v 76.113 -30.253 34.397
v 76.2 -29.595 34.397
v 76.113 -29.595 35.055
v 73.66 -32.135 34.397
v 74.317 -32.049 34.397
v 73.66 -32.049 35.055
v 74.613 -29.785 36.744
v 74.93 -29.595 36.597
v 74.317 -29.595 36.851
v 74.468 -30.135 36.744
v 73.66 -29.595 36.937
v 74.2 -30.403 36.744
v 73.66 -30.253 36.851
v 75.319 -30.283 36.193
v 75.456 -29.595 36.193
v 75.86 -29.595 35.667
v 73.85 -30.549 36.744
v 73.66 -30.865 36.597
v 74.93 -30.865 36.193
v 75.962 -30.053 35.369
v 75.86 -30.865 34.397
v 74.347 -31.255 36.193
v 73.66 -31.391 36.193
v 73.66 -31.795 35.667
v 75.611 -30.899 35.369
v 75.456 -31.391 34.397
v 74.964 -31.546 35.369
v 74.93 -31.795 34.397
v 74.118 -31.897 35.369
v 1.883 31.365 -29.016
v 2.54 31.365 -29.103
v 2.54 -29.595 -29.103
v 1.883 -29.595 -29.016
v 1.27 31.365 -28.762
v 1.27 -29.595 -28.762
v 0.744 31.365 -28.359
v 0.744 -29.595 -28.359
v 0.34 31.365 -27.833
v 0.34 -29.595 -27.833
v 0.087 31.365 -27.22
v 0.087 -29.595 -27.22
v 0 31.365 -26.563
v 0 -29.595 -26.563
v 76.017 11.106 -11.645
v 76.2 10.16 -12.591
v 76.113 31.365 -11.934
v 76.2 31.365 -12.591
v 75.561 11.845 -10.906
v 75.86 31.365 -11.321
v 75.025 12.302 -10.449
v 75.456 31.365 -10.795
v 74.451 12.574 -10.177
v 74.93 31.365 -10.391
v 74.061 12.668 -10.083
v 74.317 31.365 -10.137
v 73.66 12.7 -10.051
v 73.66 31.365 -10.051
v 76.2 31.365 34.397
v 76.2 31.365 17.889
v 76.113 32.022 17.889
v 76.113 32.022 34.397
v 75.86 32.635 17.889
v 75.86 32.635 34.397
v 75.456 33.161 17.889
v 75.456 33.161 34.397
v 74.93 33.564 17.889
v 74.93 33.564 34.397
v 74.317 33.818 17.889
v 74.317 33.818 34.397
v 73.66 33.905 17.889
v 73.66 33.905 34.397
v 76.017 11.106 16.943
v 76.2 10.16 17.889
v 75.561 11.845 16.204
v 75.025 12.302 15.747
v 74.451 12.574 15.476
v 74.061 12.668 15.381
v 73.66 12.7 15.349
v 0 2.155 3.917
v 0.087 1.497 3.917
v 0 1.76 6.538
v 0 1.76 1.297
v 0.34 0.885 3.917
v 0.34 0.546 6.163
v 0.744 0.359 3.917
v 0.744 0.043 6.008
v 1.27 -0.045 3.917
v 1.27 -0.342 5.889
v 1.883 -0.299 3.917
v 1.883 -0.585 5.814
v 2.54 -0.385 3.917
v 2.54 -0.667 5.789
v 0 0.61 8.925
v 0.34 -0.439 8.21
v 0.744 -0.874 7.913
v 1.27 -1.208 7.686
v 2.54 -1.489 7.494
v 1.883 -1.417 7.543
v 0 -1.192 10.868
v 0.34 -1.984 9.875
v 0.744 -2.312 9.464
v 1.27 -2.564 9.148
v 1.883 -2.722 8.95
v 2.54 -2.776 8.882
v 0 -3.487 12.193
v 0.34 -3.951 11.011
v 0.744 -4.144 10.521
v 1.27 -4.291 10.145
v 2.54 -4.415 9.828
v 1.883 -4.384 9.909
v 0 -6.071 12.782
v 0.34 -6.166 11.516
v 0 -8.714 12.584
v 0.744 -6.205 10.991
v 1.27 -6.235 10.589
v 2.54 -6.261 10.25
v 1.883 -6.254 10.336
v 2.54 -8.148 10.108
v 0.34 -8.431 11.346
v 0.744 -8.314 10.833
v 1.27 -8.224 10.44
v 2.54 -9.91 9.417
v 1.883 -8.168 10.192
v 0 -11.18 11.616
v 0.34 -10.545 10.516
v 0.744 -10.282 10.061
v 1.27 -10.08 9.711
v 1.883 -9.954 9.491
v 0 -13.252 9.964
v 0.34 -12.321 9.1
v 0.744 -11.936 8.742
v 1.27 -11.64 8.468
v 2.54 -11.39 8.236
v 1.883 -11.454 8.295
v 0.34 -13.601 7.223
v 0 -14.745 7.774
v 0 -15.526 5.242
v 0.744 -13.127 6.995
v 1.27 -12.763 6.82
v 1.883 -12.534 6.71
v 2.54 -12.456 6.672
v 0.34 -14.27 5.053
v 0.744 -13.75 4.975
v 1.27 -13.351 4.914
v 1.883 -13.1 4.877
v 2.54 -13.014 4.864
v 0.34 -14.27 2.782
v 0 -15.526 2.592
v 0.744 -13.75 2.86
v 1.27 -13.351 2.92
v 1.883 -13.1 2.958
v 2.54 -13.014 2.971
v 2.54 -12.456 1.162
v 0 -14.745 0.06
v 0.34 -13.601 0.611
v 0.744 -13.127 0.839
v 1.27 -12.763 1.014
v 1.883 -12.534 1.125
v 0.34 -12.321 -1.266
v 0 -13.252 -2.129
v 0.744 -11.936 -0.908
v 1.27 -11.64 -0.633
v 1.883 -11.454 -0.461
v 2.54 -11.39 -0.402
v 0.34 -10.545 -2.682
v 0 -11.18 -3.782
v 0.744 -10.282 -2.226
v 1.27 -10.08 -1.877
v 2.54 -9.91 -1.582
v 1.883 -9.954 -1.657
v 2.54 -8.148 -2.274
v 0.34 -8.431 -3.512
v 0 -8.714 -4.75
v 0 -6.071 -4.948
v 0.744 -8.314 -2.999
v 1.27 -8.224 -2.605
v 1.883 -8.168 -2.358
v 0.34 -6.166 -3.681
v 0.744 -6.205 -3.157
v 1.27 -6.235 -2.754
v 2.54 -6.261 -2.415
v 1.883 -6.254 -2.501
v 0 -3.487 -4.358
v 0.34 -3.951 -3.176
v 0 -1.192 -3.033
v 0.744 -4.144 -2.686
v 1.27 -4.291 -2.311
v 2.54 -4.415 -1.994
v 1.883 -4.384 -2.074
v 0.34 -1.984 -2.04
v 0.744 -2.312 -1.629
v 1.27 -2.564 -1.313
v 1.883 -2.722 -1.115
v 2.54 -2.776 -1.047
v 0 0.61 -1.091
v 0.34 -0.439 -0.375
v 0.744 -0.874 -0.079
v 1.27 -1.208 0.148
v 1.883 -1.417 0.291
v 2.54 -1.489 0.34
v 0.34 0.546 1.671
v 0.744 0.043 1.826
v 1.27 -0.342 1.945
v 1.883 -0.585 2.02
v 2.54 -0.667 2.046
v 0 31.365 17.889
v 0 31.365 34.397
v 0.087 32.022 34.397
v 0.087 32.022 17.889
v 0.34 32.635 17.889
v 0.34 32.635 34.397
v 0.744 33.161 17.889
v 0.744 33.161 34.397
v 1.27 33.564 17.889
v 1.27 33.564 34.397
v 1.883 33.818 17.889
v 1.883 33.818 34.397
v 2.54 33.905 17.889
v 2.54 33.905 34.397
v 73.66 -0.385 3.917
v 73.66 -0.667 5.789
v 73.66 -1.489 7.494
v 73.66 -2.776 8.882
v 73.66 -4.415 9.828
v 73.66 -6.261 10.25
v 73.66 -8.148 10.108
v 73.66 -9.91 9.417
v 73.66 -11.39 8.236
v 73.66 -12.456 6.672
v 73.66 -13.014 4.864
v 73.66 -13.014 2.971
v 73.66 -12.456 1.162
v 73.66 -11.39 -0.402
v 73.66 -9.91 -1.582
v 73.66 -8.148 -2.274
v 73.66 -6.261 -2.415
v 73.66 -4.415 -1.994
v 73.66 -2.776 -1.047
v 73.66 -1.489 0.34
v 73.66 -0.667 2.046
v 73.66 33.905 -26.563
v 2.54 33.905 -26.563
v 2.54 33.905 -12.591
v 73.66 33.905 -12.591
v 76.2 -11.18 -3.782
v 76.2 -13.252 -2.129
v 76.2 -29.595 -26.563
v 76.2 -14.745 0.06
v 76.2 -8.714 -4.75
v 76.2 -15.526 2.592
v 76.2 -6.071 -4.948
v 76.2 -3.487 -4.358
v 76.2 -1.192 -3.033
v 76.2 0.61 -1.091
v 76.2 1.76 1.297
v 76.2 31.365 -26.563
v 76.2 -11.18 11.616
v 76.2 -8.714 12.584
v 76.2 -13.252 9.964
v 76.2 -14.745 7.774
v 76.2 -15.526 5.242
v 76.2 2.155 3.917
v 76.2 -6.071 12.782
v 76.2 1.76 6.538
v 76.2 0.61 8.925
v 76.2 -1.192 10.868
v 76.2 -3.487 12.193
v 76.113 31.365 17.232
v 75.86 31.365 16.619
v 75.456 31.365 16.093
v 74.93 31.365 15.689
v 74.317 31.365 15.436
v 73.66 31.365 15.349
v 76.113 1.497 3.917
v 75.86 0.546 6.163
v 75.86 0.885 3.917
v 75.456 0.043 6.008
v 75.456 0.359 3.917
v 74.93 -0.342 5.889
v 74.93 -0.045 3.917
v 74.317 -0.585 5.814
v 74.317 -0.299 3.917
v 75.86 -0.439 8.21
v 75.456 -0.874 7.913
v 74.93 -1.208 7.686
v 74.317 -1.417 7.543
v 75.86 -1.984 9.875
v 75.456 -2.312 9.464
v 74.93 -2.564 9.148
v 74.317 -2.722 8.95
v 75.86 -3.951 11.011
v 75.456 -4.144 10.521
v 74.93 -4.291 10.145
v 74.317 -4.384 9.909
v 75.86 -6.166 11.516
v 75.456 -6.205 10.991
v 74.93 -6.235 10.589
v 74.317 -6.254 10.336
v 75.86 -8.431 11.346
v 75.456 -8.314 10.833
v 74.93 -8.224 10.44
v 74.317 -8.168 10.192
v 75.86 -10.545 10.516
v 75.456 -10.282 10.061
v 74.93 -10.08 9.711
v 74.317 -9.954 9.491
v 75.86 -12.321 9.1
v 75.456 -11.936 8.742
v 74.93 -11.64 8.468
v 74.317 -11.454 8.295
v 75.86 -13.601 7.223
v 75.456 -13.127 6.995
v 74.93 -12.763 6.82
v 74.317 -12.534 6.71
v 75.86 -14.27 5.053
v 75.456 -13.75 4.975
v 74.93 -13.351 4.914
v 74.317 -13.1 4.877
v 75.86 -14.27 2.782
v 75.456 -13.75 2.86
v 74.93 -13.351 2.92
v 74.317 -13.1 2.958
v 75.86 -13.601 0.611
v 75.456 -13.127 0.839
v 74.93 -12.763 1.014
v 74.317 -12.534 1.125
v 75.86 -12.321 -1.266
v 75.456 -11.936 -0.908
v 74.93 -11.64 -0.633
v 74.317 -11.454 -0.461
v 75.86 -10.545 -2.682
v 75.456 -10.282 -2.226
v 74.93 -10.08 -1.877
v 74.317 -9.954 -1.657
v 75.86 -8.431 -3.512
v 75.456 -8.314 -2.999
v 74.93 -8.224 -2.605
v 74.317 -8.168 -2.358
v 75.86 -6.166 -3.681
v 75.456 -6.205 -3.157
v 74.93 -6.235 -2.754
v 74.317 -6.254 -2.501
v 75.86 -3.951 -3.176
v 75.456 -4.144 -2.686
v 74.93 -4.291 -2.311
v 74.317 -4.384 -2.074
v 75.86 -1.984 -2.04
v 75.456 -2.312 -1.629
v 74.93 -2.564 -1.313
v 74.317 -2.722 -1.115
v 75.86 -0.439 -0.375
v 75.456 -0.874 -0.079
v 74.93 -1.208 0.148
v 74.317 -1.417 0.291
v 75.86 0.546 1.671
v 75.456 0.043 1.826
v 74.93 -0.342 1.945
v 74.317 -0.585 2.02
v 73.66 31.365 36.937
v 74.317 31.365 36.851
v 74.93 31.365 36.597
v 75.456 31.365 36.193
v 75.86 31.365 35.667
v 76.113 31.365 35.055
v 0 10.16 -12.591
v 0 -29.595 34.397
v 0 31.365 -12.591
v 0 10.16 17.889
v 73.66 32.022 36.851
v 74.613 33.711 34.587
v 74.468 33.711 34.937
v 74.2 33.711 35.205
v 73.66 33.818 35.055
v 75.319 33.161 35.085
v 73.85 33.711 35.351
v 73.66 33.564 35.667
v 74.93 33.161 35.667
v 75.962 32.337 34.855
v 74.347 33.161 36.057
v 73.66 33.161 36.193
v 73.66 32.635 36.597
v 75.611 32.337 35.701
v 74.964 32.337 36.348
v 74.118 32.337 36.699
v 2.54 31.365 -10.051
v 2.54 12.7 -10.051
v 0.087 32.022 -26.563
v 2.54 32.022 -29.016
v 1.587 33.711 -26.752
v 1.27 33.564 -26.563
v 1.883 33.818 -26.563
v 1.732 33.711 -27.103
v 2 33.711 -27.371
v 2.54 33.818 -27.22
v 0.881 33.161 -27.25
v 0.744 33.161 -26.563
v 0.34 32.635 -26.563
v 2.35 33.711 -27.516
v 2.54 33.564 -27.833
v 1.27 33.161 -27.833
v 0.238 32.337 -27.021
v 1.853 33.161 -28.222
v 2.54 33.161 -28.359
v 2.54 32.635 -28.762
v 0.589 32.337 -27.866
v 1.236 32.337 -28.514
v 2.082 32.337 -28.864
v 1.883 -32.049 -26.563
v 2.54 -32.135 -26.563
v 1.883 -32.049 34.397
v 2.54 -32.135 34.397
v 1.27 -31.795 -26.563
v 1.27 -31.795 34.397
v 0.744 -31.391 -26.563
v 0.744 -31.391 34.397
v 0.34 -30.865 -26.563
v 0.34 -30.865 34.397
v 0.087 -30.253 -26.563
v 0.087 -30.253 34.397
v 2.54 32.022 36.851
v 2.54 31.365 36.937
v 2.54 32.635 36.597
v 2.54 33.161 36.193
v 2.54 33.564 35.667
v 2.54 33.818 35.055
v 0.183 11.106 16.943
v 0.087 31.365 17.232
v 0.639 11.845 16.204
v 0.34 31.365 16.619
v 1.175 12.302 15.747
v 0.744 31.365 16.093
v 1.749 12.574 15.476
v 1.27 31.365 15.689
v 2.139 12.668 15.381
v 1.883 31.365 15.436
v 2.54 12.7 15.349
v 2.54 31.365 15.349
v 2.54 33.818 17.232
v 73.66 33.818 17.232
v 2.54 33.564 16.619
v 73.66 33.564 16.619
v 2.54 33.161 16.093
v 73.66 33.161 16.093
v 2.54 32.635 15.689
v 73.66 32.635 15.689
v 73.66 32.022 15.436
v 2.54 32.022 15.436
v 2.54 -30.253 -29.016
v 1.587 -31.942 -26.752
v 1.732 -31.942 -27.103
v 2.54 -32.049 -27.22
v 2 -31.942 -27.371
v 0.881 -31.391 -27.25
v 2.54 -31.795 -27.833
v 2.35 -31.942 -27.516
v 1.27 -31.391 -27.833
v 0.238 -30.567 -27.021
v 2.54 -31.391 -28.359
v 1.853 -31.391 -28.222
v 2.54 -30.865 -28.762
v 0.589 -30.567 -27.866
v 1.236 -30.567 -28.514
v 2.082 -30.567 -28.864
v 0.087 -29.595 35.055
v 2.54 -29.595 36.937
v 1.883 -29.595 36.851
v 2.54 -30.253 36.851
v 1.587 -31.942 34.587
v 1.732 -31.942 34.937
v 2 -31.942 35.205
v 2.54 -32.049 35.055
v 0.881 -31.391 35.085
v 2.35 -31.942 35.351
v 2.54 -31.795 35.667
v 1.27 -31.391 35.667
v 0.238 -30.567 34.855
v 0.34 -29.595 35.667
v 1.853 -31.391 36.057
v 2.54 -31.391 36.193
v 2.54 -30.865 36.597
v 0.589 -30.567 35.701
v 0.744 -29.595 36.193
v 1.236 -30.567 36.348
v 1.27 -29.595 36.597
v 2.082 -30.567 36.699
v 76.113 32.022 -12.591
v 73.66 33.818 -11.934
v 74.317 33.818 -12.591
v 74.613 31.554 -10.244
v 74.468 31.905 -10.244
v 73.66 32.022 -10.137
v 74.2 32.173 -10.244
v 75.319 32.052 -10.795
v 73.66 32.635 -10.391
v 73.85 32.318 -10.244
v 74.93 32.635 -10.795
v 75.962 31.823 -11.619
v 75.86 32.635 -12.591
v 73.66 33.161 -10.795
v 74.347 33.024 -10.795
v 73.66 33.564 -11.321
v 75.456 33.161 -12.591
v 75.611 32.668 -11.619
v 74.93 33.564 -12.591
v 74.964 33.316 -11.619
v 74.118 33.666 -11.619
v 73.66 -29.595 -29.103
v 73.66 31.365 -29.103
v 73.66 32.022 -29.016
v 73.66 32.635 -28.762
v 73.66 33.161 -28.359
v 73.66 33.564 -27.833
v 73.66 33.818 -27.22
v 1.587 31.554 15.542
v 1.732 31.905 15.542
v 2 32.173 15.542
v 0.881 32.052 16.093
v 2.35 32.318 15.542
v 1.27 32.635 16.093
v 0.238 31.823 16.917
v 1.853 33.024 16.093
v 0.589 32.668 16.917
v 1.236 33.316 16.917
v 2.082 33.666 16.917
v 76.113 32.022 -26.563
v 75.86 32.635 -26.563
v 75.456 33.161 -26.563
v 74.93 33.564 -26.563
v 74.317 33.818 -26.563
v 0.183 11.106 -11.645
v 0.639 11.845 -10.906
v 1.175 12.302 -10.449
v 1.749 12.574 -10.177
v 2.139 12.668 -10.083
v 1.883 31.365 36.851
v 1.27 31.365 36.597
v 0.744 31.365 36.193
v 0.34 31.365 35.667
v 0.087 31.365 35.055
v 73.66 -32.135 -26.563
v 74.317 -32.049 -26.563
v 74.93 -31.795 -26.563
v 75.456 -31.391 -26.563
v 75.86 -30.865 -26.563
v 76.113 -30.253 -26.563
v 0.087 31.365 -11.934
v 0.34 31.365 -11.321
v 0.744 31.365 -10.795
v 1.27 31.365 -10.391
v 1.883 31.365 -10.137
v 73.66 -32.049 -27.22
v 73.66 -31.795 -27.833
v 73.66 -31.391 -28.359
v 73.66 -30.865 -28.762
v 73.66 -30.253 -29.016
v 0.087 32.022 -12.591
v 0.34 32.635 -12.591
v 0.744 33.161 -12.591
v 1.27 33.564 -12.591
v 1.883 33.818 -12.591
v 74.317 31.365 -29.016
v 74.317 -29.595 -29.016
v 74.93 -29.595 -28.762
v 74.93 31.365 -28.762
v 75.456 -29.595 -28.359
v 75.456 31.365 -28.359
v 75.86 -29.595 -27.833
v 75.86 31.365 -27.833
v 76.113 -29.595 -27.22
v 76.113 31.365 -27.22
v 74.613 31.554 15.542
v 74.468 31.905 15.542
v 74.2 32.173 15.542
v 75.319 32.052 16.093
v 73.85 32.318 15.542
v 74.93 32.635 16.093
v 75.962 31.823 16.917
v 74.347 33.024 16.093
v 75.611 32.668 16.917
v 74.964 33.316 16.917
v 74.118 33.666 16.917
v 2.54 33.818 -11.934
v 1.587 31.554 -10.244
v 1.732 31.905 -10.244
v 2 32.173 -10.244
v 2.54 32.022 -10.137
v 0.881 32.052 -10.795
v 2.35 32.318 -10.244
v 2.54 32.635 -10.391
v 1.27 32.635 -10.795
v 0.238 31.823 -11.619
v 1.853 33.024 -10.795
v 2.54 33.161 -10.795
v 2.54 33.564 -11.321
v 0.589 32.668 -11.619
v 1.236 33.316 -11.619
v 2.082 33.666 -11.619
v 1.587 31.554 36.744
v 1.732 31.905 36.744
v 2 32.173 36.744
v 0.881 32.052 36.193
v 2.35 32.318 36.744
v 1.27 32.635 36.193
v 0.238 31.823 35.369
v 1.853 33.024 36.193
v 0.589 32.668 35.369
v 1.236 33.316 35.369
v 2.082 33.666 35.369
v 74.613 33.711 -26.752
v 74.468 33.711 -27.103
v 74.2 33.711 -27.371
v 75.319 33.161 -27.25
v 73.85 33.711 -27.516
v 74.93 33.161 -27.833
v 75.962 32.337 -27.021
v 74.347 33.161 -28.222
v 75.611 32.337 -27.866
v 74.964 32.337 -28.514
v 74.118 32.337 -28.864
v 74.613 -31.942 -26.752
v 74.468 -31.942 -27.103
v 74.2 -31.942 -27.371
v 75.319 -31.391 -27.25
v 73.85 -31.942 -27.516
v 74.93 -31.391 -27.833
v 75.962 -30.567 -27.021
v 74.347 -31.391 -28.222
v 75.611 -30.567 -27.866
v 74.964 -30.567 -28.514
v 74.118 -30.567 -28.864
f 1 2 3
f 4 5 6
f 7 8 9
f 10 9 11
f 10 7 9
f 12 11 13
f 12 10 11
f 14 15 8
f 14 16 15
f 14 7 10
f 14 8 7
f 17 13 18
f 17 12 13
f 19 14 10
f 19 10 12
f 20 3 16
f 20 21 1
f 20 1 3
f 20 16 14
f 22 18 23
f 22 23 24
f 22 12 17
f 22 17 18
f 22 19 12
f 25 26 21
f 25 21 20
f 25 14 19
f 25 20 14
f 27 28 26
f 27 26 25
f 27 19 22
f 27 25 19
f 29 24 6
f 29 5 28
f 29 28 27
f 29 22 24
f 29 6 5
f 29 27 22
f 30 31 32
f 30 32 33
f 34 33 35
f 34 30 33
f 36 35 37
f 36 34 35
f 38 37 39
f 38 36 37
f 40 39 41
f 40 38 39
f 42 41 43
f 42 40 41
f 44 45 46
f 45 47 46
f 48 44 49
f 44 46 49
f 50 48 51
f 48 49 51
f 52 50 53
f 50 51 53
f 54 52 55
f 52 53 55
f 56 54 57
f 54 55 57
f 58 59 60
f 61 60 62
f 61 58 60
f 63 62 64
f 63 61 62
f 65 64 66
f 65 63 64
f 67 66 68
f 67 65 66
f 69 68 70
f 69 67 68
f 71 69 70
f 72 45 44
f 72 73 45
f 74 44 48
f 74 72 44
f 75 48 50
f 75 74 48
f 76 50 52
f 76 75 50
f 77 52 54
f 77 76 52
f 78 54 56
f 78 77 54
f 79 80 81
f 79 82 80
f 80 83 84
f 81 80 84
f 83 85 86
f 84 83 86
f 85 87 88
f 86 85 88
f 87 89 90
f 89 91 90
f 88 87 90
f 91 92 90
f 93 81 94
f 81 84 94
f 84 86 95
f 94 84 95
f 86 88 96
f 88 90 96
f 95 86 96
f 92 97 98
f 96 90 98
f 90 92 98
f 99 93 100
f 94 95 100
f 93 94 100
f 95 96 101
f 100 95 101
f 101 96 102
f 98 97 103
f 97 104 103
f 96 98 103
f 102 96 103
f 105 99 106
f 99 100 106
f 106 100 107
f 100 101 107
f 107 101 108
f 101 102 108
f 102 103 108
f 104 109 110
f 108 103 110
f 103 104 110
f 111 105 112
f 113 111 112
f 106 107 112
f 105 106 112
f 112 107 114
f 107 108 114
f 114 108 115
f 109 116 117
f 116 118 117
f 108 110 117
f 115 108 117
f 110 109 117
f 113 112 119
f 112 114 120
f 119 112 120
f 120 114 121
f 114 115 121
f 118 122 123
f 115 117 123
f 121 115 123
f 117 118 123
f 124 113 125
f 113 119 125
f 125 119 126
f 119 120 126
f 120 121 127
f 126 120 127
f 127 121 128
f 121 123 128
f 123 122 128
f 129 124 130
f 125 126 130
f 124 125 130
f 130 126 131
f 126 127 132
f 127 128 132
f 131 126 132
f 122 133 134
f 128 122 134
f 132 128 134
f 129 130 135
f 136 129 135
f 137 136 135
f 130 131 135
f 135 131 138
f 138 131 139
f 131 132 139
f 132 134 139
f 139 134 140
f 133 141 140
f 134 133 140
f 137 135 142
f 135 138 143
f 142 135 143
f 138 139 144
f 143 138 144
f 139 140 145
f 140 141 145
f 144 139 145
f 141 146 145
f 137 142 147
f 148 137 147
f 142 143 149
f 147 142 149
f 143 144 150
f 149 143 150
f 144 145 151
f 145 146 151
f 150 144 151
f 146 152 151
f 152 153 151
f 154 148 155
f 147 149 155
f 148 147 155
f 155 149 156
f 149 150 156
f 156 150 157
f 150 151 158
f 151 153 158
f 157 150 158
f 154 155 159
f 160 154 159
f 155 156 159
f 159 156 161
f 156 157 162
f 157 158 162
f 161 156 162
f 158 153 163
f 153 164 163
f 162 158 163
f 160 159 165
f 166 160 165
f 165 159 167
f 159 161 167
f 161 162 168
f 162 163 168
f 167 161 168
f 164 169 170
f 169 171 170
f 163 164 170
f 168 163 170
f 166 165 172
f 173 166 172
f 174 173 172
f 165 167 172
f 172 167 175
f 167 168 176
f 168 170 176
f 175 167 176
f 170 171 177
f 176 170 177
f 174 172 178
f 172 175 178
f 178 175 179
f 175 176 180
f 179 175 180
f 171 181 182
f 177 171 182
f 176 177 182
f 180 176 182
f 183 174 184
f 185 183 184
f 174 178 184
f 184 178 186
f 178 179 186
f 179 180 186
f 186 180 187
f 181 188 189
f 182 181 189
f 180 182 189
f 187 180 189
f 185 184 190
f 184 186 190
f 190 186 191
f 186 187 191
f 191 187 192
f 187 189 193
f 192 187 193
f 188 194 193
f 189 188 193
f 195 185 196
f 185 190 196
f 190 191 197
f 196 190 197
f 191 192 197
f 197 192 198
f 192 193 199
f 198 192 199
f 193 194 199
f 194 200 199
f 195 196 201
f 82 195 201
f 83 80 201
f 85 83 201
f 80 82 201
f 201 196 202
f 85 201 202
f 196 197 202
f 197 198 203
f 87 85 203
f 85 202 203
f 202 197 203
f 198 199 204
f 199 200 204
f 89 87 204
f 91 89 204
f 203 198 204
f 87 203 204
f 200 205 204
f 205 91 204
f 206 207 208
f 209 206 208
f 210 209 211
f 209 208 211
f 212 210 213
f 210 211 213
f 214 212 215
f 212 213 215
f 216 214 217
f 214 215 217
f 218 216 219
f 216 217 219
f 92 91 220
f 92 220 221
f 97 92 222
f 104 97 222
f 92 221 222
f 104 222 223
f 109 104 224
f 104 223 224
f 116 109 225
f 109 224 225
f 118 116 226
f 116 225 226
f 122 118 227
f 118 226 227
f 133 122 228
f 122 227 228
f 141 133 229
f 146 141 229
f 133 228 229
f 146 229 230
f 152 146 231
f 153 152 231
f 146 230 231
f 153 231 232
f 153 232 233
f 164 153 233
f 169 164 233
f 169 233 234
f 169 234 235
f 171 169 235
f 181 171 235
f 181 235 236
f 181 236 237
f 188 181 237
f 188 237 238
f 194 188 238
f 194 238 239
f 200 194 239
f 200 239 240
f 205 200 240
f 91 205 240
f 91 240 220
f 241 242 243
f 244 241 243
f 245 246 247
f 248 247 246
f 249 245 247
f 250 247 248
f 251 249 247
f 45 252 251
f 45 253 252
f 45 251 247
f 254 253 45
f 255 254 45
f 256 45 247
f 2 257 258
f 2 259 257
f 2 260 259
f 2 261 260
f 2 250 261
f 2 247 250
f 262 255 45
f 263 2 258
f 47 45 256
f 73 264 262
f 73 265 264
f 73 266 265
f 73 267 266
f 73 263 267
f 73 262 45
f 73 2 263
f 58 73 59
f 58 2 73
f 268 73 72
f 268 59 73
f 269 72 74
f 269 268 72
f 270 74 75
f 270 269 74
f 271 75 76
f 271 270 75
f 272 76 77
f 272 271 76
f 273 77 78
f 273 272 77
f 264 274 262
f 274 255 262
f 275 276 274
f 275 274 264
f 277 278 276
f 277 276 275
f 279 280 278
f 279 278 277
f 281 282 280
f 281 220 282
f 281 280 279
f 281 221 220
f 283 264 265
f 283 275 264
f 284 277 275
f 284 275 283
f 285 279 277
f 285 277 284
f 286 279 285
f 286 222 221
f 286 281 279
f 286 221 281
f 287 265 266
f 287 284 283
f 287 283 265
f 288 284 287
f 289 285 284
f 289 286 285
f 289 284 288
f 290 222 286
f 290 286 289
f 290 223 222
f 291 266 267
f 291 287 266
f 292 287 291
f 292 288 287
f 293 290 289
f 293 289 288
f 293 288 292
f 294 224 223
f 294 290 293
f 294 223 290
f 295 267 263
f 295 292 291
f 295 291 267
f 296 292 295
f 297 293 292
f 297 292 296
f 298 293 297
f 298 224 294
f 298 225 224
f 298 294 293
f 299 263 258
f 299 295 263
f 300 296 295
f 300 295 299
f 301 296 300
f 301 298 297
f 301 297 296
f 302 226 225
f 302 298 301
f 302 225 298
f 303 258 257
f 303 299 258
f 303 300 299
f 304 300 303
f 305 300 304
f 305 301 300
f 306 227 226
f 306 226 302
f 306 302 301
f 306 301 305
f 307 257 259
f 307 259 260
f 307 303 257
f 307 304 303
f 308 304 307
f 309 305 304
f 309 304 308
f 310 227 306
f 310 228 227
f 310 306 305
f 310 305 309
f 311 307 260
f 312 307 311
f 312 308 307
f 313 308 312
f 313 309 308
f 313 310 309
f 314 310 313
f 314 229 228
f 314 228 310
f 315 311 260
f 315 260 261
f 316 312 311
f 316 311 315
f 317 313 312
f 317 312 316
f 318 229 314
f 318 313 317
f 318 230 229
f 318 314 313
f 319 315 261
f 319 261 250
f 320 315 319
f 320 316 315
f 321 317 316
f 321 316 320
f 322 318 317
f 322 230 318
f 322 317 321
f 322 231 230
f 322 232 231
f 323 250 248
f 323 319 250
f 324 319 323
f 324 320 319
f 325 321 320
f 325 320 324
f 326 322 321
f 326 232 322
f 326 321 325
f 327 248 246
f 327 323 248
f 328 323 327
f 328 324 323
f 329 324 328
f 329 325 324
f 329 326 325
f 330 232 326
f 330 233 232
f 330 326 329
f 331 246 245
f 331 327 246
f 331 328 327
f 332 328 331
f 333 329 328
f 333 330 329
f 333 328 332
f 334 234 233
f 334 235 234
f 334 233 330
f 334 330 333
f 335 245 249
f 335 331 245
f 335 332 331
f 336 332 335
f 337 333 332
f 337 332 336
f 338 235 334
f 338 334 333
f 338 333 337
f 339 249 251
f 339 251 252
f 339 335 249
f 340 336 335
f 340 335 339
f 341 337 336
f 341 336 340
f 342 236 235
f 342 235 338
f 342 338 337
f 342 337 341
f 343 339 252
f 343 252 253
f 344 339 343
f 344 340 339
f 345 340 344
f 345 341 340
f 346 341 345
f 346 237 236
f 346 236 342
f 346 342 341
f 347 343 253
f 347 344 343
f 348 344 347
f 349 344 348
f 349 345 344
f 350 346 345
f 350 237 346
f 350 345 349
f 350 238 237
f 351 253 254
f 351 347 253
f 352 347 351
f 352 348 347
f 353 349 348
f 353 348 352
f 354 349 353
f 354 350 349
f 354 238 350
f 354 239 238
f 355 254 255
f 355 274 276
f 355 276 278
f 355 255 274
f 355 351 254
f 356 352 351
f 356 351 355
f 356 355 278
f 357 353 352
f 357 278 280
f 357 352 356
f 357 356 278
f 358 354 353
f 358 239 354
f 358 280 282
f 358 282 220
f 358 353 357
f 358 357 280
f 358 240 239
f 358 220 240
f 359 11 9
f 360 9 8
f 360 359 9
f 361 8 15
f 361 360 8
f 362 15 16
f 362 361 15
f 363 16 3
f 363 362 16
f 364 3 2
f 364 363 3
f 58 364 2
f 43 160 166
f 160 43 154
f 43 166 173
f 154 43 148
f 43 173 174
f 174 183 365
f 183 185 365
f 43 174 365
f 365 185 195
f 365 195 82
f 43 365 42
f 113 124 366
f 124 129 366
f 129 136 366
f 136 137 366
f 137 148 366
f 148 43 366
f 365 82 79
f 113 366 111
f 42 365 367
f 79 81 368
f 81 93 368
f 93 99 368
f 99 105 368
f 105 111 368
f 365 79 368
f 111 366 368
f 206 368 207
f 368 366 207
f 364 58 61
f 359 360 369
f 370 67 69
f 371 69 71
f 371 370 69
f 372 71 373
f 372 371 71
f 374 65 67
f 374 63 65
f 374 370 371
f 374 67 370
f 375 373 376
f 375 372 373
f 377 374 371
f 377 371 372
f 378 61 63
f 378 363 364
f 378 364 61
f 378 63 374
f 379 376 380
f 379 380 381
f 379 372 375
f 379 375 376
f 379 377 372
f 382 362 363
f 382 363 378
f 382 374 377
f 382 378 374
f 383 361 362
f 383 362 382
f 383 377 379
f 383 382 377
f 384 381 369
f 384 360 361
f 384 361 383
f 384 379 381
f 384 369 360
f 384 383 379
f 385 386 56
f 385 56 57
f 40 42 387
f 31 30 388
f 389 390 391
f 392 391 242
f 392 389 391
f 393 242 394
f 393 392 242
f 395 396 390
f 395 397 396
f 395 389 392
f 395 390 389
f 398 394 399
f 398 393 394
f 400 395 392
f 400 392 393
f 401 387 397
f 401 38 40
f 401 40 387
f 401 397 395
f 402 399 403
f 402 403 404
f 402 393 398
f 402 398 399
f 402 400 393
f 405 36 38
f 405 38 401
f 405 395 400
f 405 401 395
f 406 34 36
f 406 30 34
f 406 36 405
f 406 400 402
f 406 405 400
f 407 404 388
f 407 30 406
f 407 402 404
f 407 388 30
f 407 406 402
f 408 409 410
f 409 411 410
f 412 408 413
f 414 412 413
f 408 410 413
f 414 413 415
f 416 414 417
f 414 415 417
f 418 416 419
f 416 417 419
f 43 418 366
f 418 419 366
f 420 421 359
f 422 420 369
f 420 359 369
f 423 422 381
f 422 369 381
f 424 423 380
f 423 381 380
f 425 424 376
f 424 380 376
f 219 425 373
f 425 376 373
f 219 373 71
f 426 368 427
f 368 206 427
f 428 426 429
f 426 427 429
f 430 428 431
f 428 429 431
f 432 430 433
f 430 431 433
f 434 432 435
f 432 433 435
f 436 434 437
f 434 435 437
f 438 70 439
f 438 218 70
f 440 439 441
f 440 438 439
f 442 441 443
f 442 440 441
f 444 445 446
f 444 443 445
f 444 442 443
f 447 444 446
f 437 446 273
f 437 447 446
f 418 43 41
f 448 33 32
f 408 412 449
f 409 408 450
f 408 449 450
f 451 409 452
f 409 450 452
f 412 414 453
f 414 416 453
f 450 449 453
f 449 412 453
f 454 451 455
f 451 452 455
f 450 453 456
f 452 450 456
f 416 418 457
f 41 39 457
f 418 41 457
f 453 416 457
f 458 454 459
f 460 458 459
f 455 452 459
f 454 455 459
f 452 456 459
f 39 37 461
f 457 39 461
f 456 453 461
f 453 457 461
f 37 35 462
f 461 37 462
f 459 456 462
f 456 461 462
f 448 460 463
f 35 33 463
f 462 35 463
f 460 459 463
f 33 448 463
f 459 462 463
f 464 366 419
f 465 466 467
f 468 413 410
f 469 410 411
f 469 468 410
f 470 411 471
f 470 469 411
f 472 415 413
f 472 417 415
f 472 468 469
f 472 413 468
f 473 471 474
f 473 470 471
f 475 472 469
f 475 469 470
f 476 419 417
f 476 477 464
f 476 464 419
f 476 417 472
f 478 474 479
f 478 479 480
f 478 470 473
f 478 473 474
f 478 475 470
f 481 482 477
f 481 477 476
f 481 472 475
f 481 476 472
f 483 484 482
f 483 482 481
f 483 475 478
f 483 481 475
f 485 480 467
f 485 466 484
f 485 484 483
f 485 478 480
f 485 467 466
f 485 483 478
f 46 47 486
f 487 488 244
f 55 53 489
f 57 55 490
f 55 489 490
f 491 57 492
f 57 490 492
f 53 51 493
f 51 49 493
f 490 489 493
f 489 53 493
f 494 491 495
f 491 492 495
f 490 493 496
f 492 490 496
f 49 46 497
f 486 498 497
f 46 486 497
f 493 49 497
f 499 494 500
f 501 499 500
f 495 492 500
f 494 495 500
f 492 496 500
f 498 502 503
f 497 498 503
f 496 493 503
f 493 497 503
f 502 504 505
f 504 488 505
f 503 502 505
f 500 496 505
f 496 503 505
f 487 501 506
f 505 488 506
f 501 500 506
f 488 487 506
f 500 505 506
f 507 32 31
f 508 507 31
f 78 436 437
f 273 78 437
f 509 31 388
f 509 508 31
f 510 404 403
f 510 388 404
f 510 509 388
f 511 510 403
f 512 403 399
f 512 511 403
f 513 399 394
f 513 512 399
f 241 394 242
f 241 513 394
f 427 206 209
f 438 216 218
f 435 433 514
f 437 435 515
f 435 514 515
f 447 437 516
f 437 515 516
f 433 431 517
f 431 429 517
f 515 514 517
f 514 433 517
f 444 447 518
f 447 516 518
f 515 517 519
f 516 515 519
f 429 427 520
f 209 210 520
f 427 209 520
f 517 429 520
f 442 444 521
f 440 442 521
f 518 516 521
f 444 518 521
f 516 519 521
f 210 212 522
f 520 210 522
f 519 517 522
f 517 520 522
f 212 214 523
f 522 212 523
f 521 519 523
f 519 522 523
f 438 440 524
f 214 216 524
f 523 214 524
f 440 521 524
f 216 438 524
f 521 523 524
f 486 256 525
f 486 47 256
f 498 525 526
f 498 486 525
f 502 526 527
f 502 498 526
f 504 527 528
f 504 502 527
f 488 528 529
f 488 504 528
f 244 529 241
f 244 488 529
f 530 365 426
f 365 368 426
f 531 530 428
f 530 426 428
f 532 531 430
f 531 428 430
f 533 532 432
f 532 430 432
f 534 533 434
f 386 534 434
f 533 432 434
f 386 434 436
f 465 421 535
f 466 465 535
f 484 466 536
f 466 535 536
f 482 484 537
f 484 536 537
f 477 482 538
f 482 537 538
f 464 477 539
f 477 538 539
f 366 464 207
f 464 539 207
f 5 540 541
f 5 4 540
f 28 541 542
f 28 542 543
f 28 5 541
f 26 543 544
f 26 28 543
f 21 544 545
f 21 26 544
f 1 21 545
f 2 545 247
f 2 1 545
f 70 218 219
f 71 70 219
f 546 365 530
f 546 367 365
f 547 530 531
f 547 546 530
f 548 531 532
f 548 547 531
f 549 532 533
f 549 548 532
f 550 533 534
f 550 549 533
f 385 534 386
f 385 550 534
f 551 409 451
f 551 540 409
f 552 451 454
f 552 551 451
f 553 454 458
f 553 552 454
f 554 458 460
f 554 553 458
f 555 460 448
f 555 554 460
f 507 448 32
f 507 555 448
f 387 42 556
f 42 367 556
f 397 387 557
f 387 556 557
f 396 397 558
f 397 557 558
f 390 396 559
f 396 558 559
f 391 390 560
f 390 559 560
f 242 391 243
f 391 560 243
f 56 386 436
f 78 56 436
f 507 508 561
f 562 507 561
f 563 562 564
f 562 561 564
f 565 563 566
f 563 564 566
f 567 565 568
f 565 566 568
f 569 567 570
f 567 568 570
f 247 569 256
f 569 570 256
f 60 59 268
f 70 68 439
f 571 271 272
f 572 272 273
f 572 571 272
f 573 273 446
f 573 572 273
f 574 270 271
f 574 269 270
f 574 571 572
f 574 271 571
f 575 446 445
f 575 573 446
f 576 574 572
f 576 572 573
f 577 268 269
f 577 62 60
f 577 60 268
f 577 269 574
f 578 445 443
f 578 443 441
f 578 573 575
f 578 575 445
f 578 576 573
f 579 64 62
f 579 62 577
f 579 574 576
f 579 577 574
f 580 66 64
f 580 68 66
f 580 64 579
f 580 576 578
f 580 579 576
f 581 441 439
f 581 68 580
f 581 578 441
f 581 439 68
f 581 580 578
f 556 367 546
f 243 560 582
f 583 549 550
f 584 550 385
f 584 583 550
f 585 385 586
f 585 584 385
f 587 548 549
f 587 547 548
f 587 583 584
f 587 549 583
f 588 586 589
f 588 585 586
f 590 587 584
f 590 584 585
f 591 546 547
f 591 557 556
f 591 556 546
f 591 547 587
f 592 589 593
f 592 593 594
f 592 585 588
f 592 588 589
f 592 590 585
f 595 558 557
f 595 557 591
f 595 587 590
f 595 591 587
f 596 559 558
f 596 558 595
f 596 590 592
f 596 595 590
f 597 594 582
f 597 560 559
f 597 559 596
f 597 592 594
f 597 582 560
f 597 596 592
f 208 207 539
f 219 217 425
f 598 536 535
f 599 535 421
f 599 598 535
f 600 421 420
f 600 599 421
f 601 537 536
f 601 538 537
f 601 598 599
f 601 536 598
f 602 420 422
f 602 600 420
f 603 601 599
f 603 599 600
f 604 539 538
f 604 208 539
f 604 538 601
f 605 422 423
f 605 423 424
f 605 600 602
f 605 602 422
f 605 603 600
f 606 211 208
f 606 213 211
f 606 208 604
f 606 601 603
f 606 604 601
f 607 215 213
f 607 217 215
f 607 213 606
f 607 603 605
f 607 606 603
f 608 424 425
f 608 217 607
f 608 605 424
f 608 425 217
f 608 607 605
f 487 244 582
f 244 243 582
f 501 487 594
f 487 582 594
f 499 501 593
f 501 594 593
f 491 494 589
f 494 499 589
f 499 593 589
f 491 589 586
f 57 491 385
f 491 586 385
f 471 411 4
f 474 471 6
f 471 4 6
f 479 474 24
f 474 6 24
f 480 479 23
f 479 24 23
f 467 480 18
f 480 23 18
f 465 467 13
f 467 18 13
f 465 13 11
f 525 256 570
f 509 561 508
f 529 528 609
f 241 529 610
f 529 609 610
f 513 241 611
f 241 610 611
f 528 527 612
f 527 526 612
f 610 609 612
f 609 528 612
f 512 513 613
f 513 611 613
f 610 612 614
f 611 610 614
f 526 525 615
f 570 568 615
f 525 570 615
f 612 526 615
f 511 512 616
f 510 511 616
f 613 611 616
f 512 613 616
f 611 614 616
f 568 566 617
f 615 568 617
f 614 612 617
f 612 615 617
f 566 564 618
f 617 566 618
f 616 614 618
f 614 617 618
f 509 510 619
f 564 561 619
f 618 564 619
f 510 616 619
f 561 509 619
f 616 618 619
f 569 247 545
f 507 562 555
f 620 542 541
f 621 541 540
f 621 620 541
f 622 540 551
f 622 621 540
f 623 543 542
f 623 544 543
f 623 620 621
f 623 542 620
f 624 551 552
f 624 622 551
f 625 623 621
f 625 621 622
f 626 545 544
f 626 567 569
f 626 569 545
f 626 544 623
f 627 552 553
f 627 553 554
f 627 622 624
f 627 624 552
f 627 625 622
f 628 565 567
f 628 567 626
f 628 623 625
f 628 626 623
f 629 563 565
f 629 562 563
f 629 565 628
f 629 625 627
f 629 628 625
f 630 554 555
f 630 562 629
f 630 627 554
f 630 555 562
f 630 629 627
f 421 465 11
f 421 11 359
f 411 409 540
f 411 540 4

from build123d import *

# Parameters (mm, degrees)
F0_W     = 66.04
F0_H     = 66.04
F2_DEPTH = 76.2
F1_W     = 38.1
F1_H     = 25.4
F3_DEPTH = 76.2
F4_R     = 6.35
F5_DEPTH = 101.6
F6_R     = 2.54


with BuildPart() as f2:
    # F0 (on Right) → F2 (new body)
    with BuildSketch(Plane.YZ):
        with Locations((0.8847024292, 3.9172693067)):
            Rectangle(F0_W, F0_H)
    extrude(amount=F2_DEPTH)

    # F1 (on Right) → F3 (cut)
    with BuildSketch(Plane.YZ):
        with Locations((31.75, 2.6490623131)):
            Rectangle(F1_W, F1_H)
    extrude(amount=F3_DEPTH, mode=Mode.SUBTRACT)

    # F4 (on face) → F5 (cut)
    with BuildSketch(Plane.YZ.offset(76.2)):
        with Locations((-6.7352975708, 3.9172693067)):
            Circle(F4_R)
    extrude(amount=-F5_DEPTH, mode=Mode.SUBTRACT)

    # F6
    f6_edges = [f2.edges().sort_by_distance(p)[0] for p in [
        (0, 33.904702, 26.143166),
        (0, 0.884702, 36.937269),
        (0, 0.884702, -29.102731),
        (0, -32.135298, 3.917269),
        (0, 33.904702, -19.576834),
        (0, 23.302351, -10.050938),
        (0, 12.7, 2.649062),
        (0, 23.302351, 15.349062),
        (0, -13.085298, 3.917269),
        (76.2, 0.884702, -29.102731),
        (76.2, -32.135298, 3.917269),
        (76.2, 33.904702, -19.576834),
        (76.2, 0.884702, 36.937269),
        (76.2, 23.302351, -10.050938),
        (76.2, 33.904702, 26.143166),
        (76.2, 12.7, 2.649062),
        (76.2, 23.302351, 15.349062),
        (76.2, -13.085298, 3.917269),
        (38.1, 33.904702, 36.937269),
        (38.1, 33.904702, 15.349062),
        (38.1, 33.904702, -10.050938),
        (38.1, 33.904702, -29.102731),
        (38.1, -32.135298, -29.102731),
        (38.1, -32.135298, 36.937269),
    ]]
    fillet(f6_edges, radius=F6_R)


solid = f2.part
